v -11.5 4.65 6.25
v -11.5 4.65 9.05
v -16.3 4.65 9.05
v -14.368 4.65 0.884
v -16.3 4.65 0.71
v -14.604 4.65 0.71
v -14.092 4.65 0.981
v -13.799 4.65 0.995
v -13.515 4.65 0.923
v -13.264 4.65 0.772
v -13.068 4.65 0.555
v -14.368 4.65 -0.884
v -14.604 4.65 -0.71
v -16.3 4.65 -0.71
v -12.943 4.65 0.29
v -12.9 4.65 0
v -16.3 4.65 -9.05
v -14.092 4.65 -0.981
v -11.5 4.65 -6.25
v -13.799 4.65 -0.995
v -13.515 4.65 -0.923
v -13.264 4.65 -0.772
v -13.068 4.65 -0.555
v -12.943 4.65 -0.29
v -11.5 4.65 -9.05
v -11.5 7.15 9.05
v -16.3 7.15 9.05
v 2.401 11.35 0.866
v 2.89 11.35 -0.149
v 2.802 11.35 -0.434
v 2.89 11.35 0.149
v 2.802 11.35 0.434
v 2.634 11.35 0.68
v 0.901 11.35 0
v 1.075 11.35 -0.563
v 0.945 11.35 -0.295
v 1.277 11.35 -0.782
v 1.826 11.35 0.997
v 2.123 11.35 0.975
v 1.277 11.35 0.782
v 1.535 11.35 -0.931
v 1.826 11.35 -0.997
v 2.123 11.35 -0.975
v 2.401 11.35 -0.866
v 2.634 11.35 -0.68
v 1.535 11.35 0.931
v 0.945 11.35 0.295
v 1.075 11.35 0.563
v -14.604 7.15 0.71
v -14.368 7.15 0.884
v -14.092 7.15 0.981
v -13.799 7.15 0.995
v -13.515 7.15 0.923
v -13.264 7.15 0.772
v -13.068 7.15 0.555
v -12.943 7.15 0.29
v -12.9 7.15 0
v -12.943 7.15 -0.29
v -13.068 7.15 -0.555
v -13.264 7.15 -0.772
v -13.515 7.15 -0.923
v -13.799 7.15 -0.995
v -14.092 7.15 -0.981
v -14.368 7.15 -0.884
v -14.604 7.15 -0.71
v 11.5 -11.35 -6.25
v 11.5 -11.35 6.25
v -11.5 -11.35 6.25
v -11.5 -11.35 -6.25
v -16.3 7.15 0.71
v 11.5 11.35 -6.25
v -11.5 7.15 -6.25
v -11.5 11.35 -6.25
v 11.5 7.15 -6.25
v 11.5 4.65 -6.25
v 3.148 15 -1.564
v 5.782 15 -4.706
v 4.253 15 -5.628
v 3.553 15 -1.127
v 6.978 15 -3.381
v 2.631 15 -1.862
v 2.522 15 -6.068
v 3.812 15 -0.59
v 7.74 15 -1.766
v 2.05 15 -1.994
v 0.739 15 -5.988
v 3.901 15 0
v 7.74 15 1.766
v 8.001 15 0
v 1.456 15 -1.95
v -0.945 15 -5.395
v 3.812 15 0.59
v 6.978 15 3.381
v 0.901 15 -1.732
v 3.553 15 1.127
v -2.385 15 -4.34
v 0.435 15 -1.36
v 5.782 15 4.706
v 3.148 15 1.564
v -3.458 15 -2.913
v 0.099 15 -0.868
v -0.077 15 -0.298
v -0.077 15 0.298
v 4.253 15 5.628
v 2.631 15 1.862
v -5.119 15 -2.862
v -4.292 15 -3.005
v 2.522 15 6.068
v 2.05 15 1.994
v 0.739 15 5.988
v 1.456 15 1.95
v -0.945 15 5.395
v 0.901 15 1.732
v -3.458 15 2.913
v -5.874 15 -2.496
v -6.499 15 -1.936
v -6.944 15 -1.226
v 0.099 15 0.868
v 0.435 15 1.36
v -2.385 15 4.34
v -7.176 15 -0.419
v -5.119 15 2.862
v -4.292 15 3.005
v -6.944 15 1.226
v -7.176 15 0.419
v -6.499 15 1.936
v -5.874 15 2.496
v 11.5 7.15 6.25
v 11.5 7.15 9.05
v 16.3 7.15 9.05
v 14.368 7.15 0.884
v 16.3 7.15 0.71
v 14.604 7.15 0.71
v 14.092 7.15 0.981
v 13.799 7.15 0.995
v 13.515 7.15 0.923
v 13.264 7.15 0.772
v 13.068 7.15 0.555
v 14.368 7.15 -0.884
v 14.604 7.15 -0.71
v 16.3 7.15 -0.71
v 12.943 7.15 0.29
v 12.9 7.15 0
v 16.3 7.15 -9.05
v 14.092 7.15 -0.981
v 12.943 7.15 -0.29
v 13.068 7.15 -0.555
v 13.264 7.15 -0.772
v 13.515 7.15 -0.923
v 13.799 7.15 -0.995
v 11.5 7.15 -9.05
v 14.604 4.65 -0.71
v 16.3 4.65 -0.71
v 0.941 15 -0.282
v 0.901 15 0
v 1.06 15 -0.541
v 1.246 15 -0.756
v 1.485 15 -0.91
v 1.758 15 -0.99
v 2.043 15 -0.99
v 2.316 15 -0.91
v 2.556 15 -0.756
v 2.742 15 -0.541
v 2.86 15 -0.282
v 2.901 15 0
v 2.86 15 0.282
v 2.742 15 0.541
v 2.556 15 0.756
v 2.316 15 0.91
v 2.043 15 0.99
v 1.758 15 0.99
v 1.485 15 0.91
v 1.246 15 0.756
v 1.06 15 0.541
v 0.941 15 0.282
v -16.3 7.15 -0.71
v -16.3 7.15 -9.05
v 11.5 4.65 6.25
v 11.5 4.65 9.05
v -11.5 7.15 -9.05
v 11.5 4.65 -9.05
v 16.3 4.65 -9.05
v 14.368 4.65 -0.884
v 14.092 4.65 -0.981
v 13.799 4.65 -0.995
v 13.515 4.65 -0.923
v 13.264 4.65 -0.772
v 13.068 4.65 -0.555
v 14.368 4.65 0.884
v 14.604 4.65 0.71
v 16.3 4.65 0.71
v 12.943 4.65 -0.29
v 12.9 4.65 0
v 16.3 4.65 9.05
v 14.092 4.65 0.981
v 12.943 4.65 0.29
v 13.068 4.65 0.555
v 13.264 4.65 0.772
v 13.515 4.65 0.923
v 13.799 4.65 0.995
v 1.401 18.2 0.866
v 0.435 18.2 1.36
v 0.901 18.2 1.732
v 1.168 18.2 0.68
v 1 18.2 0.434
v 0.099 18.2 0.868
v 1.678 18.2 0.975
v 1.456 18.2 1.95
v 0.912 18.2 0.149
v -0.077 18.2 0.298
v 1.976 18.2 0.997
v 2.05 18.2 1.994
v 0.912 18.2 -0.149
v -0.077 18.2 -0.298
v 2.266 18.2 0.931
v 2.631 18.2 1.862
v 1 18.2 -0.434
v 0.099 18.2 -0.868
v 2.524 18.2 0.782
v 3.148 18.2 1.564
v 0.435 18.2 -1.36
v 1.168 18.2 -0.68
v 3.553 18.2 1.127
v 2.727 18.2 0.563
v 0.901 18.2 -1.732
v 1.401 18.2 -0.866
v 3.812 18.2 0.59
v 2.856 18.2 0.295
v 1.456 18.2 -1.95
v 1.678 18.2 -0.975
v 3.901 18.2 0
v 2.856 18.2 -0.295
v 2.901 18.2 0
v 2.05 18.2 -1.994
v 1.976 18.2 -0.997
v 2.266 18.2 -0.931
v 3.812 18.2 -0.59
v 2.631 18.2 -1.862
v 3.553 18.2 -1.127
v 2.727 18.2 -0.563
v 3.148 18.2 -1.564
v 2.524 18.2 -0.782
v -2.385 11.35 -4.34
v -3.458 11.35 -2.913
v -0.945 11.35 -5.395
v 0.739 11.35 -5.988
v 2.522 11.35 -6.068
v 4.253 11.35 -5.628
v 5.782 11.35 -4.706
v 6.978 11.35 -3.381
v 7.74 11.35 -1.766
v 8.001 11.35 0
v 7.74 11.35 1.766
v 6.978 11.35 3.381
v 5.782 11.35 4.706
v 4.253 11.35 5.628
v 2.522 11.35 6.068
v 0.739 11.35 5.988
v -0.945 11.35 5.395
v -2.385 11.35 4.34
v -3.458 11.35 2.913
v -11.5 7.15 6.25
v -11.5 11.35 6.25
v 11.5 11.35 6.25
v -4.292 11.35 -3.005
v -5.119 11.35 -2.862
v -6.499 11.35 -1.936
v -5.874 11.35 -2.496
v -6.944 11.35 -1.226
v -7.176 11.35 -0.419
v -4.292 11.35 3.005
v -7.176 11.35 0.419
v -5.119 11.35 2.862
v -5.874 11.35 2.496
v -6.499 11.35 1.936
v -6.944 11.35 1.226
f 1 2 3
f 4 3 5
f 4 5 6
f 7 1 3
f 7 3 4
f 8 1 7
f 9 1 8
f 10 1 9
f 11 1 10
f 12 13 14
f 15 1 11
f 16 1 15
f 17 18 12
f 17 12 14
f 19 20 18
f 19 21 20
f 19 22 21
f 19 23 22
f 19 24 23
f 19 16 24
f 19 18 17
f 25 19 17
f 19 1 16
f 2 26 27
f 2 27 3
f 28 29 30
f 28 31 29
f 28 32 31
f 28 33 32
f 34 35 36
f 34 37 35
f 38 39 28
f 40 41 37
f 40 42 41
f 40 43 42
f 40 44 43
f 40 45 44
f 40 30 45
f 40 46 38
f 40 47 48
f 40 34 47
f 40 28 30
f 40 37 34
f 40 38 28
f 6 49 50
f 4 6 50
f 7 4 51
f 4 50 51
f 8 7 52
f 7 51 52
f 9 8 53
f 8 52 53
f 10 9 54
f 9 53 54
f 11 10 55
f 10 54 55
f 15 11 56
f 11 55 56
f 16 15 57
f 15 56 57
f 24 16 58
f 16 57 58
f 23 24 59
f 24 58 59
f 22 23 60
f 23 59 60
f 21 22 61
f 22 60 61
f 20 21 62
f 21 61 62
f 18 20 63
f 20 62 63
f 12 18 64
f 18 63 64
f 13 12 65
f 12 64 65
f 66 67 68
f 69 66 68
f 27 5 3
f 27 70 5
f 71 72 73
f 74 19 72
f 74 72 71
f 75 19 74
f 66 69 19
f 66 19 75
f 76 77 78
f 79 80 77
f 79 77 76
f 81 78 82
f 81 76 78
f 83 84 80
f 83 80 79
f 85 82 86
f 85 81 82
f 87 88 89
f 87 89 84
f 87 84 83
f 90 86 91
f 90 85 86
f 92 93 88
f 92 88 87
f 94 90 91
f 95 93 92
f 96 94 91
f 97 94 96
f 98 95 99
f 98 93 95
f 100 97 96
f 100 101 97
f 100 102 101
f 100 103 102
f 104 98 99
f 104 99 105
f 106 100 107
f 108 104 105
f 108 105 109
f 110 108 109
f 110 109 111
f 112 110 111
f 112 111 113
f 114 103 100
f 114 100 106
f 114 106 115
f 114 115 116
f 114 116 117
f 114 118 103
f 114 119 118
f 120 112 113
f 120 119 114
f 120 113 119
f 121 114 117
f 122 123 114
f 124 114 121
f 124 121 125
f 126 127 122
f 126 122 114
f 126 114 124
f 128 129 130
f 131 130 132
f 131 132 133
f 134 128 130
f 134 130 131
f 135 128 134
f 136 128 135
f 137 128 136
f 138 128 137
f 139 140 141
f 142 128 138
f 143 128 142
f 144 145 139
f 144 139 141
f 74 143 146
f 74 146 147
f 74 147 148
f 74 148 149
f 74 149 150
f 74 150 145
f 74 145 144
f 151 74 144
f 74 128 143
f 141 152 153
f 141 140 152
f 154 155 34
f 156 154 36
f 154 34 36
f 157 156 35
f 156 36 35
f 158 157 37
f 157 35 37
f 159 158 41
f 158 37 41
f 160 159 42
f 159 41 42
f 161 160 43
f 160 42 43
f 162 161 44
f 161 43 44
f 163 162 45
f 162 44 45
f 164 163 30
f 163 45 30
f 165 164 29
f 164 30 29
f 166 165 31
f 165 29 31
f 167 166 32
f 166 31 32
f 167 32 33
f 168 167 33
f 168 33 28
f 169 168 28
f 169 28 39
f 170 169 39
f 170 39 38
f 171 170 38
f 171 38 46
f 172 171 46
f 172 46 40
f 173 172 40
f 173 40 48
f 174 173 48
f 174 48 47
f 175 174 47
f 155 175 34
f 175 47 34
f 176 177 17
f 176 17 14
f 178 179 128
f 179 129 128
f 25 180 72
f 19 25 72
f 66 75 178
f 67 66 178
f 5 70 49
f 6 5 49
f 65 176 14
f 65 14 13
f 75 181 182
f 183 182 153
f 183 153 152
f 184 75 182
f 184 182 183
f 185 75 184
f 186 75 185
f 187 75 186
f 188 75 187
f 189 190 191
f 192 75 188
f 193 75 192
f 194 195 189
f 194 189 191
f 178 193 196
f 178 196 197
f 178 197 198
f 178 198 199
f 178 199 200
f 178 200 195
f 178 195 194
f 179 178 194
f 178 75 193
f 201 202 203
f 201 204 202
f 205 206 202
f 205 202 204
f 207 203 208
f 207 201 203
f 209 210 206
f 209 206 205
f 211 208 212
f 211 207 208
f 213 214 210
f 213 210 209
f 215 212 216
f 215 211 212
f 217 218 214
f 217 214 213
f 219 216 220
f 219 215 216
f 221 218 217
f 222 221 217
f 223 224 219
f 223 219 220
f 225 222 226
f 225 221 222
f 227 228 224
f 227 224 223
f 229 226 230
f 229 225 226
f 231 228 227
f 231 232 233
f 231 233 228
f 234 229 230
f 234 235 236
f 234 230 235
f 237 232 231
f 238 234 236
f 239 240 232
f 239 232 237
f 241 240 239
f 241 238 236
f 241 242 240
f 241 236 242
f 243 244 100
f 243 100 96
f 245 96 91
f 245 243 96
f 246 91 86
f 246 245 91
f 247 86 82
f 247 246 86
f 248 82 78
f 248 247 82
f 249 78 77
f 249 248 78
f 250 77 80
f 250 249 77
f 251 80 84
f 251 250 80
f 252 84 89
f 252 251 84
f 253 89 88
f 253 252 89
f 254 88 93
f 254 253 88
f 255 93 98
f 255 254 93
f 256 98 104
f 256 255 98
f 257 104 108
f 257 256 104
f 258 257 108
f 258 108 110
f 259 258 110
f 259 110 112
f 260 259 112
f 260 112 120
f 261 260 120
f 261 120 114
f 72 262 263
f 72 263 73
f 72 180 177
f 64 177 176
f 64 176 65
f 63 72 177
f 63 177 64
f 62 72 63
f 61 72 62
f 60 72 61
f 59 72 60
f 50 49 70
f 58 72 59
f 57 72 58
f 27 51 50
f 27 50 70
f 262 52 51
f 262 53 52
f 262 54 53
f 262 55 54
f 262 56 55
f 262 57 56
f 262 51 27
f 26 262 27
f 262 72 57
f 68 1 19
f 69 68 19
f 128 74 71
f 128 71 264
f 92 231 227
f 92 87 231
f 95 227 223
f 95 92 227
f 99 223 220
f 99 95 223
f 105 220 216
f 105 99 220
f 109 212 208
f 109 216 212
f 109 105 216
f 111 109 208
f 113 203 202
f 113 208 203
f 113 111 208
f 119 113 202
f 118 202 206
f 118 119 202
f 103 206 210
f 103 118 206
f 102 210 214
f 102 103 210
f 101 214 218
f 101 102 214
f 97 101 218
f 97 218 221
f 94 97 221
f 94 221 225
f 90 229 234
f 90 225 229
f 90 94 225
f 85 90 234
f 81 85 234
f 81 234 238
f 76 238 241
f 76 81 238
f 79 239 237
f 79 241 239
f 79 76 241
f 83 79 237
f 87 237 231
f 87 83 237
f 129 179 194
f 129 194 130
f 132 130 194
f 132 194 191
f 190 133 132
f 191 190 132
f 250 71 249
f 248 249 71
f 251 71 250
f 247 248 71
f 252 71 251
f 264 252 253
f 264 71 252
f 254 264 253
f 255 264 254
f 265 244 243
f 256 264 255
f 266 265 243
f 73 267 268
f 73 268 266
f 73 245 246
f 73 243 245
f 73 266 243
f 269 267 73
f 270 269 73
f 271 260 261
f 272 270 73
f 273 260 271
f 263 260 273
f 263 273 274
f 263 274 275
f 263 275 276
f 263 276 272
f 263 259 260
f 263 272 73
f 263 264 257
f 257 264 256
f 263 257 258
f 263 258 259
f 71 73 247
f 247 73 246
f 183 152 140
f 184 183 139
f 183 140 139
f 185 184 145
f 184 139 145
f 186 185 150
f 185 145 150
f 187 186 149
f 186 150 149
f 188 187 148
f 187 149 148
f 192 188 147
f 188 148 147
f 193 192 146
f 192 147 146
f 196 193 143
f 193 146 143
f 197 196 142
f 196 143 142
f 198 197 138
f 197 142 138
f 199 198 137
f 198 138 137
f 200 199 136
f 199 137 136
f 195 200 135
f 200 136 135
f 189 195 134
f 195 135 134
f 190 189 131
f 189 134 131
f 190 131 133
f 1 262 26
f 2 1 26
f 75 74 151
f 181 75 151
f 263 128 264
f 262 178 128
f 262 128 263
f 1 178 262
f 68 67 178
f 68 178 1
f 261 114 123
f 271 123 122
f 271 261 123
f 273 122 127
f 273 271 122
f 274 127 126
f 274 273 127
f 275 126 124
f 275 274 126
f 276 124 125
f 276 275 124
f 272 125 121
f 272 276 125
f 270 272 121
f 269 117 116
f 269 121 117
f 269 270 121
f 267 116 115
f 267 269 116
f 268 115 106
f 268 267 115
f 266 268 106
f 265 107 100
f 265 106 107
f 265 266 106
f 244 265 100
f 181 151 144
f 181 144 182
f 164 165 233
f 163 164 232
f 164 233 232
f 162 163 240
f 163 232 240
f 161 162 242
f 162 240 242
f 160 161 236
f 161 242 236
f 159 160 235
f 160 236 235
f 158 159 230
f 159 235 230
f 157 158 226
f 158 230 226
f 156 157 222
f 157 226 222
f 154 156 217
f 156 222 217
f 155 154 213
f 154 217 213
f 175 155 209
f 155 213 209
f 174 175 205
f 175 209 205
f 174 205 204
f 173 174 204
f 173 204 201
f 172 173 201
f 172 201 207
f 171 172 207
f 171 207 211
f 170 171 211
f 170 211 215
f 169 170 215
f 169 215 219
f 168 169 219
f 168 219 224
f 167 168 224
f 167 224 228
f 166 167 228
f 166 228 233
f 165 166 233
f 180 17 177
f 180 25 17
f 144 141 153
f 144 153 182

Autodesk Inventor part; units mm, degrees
sketch "Sketch1" plane through (0, 0, 0) normal (0, 1, 0) x (-1, 0, 0)
  line L0 (11.5, -6.25) -> (-11.5, -6.25)
  line L1 (-11.5, -6.25) -> (-11.5, 6.25)
  line L2 (-11.5, 6.25) -> (11.5, 6.25)
  line L3 (11.5, 6.25) -> (11.5, -6.25)
  line L4 (11.5, -6.25) -> (-11.5, 6.25) construction
  line L5 (-11.5, -6.25) -> (11.5, 6.25) construction
  point P0 (0, 0)
  dimension "d0" = 23
  dimension "d1" = 12.5
extrude "Extrusion1" add sketch "Sketch1" along normal mid plane 22.7
ref_plane "Work Plane3" through (-11.5, 0, 0) normal (1, 0, 0) x (0, 1, 0)
ref_plane "Work Plane2" through (11.5, 0, 0) normal (1, 0, 0) x (0, 1, 0)
ref_plane "Work Plane4" through (0, 5, 0) normal (0, 1, 0) x (-1, 0, 0)
ref_plane "Work Plane5" through (0, 0, 6.25) normal (0, 0, 1) x (1, 0, 0)
sketch "Sketch2" plane through (11.5, -11.35, -6.25) normal (1, 0, 0) x (0, 0, -1)
  line L0 (0, 0) -> (-12.5, 0) projected
  line L1 (-12.5, 0) -> (-12.5, 16)
  line L2 (-12.5, 0) -> (-12.5, 22.7) projected
  line L3 (-12.5, 16) -> (-15.3, 16)
  line L4 (-15.3, 16) -> (-15.3, 18.5)
  line L5 (-15.3, 18.5) -> (0, 18.5)
  line L6 (0, 18.5) -> (2.8, 18.5)
  line L7 (2.8, 18.5) -> (2.8, 16)
  line L8 (2.8, 16) -> (-12.5, 16)
  point P0 (-6.25, 11.35)
  dimension "d8" = 16
  dimension "d9" = 2.8
  dimension "d10" = 2.5
  dimension "d11" = 2.8
extrude "Extrusion2" add sketch "Sketch2" along normal blind 4.8
mirror "Mirror1" about plane through (0, 0, 0) normal (1, 0, 0) of "Extrusion2"
ref_plane "Work Plane6" through (0, 11, 0) normal (0, 1, 0) x (-1, 0, 0)
sketch "Sketch3" plane through (0, 11, 0) normal (0, 1, 0) x (-1, 0, 0)
  line L0 (-12.5008, 0) -> (-1.9008, 0)
  arc A0 (3.4585, 2.9134) -> (3.4585, -2.9134) centre (-1.9008, 0) ccw
  circle A1 centre (-1.9008, 0) radius 1
  arc A2 (3.4585, -2.9134) -> (3.4585, 2.9134) centre (4.1992, 0) ccw
  point P0 (0, 0)
  dimension "d15" = 10.6
  dimension "d16" = 12.2
  dimension "d17" = 2
extrude "Extrusion3" add sketch "Sketch3" along normal blind 4
sketch "Sketch4" plane through (0, 15, 0) normal (0, 1, 0) x (1, 0, 0)
  circle A0 centre (1.9008, 0) radius 1 projected
  circle A1 centre (1.9008, 0) radius 2
  point P0 (0, 0)
  dimension "d20" = 4
extrude "Extrusion4" add sketch "Sketch4" along normal blind 3.2 contours A0 | A1
sketch "Sketch5" plane through (1.9008, 18.2, 0) normal (0, 1, 0) x (1, 0, 0)
  circle A0 centre (0, 0) radius 1 projected
  circle A1 centre (0, 0) radius 1
  point P0 (-1.9008, 0)
  dimension "d28" = 2
extrude "Extrusion5" cut sketch "Sketch5" against normal blind 3.2
sketch "Sketch6" plane through (11.5, 7.15, -6.25) normal (0, 1, 0) x (1, 0, 0)
  circle A0 centre (-9.5992, -6.25) radius 1 projected
  line L0 (-9.5992, -6.25) -> (1.4, -6.25)
  line L1 (4.8, -15.3) -> (4.8, 2.8) projected
  line L2 (0, -12.5) -> (0, 0) projected
  line L3 (0, -6.25) -> (4.8, -6.25)
  arc A1 (3.1037, -5.5395) -> (3.1037, -6.9605) centre (2.4, -6.25) ccw
  line L4 (2.4, -5.25) -> (2.4, -5.25)
  line L5 (3.1037, -5.5395) -> (4.8, -5.5395)
  line L6 (3.1037, -6.9605) -> (4.8, -6.9605)
  line L7 (4.8, -6.9605) -> (4.8, -5.5395)
  point P0 (-11.5, -6.25)
  dimension "d25" = 2
extrude "Extrusion6" cut sketch "Sketch6" against normal blind 2.5 contours A1 L5 L1 L3 | L3 L1 L6 A1
mirror "Mirror2" about plane through (0, 0, 0) normal (1, 0, 0) of "Extrusion6"
properties part number "Motor"
